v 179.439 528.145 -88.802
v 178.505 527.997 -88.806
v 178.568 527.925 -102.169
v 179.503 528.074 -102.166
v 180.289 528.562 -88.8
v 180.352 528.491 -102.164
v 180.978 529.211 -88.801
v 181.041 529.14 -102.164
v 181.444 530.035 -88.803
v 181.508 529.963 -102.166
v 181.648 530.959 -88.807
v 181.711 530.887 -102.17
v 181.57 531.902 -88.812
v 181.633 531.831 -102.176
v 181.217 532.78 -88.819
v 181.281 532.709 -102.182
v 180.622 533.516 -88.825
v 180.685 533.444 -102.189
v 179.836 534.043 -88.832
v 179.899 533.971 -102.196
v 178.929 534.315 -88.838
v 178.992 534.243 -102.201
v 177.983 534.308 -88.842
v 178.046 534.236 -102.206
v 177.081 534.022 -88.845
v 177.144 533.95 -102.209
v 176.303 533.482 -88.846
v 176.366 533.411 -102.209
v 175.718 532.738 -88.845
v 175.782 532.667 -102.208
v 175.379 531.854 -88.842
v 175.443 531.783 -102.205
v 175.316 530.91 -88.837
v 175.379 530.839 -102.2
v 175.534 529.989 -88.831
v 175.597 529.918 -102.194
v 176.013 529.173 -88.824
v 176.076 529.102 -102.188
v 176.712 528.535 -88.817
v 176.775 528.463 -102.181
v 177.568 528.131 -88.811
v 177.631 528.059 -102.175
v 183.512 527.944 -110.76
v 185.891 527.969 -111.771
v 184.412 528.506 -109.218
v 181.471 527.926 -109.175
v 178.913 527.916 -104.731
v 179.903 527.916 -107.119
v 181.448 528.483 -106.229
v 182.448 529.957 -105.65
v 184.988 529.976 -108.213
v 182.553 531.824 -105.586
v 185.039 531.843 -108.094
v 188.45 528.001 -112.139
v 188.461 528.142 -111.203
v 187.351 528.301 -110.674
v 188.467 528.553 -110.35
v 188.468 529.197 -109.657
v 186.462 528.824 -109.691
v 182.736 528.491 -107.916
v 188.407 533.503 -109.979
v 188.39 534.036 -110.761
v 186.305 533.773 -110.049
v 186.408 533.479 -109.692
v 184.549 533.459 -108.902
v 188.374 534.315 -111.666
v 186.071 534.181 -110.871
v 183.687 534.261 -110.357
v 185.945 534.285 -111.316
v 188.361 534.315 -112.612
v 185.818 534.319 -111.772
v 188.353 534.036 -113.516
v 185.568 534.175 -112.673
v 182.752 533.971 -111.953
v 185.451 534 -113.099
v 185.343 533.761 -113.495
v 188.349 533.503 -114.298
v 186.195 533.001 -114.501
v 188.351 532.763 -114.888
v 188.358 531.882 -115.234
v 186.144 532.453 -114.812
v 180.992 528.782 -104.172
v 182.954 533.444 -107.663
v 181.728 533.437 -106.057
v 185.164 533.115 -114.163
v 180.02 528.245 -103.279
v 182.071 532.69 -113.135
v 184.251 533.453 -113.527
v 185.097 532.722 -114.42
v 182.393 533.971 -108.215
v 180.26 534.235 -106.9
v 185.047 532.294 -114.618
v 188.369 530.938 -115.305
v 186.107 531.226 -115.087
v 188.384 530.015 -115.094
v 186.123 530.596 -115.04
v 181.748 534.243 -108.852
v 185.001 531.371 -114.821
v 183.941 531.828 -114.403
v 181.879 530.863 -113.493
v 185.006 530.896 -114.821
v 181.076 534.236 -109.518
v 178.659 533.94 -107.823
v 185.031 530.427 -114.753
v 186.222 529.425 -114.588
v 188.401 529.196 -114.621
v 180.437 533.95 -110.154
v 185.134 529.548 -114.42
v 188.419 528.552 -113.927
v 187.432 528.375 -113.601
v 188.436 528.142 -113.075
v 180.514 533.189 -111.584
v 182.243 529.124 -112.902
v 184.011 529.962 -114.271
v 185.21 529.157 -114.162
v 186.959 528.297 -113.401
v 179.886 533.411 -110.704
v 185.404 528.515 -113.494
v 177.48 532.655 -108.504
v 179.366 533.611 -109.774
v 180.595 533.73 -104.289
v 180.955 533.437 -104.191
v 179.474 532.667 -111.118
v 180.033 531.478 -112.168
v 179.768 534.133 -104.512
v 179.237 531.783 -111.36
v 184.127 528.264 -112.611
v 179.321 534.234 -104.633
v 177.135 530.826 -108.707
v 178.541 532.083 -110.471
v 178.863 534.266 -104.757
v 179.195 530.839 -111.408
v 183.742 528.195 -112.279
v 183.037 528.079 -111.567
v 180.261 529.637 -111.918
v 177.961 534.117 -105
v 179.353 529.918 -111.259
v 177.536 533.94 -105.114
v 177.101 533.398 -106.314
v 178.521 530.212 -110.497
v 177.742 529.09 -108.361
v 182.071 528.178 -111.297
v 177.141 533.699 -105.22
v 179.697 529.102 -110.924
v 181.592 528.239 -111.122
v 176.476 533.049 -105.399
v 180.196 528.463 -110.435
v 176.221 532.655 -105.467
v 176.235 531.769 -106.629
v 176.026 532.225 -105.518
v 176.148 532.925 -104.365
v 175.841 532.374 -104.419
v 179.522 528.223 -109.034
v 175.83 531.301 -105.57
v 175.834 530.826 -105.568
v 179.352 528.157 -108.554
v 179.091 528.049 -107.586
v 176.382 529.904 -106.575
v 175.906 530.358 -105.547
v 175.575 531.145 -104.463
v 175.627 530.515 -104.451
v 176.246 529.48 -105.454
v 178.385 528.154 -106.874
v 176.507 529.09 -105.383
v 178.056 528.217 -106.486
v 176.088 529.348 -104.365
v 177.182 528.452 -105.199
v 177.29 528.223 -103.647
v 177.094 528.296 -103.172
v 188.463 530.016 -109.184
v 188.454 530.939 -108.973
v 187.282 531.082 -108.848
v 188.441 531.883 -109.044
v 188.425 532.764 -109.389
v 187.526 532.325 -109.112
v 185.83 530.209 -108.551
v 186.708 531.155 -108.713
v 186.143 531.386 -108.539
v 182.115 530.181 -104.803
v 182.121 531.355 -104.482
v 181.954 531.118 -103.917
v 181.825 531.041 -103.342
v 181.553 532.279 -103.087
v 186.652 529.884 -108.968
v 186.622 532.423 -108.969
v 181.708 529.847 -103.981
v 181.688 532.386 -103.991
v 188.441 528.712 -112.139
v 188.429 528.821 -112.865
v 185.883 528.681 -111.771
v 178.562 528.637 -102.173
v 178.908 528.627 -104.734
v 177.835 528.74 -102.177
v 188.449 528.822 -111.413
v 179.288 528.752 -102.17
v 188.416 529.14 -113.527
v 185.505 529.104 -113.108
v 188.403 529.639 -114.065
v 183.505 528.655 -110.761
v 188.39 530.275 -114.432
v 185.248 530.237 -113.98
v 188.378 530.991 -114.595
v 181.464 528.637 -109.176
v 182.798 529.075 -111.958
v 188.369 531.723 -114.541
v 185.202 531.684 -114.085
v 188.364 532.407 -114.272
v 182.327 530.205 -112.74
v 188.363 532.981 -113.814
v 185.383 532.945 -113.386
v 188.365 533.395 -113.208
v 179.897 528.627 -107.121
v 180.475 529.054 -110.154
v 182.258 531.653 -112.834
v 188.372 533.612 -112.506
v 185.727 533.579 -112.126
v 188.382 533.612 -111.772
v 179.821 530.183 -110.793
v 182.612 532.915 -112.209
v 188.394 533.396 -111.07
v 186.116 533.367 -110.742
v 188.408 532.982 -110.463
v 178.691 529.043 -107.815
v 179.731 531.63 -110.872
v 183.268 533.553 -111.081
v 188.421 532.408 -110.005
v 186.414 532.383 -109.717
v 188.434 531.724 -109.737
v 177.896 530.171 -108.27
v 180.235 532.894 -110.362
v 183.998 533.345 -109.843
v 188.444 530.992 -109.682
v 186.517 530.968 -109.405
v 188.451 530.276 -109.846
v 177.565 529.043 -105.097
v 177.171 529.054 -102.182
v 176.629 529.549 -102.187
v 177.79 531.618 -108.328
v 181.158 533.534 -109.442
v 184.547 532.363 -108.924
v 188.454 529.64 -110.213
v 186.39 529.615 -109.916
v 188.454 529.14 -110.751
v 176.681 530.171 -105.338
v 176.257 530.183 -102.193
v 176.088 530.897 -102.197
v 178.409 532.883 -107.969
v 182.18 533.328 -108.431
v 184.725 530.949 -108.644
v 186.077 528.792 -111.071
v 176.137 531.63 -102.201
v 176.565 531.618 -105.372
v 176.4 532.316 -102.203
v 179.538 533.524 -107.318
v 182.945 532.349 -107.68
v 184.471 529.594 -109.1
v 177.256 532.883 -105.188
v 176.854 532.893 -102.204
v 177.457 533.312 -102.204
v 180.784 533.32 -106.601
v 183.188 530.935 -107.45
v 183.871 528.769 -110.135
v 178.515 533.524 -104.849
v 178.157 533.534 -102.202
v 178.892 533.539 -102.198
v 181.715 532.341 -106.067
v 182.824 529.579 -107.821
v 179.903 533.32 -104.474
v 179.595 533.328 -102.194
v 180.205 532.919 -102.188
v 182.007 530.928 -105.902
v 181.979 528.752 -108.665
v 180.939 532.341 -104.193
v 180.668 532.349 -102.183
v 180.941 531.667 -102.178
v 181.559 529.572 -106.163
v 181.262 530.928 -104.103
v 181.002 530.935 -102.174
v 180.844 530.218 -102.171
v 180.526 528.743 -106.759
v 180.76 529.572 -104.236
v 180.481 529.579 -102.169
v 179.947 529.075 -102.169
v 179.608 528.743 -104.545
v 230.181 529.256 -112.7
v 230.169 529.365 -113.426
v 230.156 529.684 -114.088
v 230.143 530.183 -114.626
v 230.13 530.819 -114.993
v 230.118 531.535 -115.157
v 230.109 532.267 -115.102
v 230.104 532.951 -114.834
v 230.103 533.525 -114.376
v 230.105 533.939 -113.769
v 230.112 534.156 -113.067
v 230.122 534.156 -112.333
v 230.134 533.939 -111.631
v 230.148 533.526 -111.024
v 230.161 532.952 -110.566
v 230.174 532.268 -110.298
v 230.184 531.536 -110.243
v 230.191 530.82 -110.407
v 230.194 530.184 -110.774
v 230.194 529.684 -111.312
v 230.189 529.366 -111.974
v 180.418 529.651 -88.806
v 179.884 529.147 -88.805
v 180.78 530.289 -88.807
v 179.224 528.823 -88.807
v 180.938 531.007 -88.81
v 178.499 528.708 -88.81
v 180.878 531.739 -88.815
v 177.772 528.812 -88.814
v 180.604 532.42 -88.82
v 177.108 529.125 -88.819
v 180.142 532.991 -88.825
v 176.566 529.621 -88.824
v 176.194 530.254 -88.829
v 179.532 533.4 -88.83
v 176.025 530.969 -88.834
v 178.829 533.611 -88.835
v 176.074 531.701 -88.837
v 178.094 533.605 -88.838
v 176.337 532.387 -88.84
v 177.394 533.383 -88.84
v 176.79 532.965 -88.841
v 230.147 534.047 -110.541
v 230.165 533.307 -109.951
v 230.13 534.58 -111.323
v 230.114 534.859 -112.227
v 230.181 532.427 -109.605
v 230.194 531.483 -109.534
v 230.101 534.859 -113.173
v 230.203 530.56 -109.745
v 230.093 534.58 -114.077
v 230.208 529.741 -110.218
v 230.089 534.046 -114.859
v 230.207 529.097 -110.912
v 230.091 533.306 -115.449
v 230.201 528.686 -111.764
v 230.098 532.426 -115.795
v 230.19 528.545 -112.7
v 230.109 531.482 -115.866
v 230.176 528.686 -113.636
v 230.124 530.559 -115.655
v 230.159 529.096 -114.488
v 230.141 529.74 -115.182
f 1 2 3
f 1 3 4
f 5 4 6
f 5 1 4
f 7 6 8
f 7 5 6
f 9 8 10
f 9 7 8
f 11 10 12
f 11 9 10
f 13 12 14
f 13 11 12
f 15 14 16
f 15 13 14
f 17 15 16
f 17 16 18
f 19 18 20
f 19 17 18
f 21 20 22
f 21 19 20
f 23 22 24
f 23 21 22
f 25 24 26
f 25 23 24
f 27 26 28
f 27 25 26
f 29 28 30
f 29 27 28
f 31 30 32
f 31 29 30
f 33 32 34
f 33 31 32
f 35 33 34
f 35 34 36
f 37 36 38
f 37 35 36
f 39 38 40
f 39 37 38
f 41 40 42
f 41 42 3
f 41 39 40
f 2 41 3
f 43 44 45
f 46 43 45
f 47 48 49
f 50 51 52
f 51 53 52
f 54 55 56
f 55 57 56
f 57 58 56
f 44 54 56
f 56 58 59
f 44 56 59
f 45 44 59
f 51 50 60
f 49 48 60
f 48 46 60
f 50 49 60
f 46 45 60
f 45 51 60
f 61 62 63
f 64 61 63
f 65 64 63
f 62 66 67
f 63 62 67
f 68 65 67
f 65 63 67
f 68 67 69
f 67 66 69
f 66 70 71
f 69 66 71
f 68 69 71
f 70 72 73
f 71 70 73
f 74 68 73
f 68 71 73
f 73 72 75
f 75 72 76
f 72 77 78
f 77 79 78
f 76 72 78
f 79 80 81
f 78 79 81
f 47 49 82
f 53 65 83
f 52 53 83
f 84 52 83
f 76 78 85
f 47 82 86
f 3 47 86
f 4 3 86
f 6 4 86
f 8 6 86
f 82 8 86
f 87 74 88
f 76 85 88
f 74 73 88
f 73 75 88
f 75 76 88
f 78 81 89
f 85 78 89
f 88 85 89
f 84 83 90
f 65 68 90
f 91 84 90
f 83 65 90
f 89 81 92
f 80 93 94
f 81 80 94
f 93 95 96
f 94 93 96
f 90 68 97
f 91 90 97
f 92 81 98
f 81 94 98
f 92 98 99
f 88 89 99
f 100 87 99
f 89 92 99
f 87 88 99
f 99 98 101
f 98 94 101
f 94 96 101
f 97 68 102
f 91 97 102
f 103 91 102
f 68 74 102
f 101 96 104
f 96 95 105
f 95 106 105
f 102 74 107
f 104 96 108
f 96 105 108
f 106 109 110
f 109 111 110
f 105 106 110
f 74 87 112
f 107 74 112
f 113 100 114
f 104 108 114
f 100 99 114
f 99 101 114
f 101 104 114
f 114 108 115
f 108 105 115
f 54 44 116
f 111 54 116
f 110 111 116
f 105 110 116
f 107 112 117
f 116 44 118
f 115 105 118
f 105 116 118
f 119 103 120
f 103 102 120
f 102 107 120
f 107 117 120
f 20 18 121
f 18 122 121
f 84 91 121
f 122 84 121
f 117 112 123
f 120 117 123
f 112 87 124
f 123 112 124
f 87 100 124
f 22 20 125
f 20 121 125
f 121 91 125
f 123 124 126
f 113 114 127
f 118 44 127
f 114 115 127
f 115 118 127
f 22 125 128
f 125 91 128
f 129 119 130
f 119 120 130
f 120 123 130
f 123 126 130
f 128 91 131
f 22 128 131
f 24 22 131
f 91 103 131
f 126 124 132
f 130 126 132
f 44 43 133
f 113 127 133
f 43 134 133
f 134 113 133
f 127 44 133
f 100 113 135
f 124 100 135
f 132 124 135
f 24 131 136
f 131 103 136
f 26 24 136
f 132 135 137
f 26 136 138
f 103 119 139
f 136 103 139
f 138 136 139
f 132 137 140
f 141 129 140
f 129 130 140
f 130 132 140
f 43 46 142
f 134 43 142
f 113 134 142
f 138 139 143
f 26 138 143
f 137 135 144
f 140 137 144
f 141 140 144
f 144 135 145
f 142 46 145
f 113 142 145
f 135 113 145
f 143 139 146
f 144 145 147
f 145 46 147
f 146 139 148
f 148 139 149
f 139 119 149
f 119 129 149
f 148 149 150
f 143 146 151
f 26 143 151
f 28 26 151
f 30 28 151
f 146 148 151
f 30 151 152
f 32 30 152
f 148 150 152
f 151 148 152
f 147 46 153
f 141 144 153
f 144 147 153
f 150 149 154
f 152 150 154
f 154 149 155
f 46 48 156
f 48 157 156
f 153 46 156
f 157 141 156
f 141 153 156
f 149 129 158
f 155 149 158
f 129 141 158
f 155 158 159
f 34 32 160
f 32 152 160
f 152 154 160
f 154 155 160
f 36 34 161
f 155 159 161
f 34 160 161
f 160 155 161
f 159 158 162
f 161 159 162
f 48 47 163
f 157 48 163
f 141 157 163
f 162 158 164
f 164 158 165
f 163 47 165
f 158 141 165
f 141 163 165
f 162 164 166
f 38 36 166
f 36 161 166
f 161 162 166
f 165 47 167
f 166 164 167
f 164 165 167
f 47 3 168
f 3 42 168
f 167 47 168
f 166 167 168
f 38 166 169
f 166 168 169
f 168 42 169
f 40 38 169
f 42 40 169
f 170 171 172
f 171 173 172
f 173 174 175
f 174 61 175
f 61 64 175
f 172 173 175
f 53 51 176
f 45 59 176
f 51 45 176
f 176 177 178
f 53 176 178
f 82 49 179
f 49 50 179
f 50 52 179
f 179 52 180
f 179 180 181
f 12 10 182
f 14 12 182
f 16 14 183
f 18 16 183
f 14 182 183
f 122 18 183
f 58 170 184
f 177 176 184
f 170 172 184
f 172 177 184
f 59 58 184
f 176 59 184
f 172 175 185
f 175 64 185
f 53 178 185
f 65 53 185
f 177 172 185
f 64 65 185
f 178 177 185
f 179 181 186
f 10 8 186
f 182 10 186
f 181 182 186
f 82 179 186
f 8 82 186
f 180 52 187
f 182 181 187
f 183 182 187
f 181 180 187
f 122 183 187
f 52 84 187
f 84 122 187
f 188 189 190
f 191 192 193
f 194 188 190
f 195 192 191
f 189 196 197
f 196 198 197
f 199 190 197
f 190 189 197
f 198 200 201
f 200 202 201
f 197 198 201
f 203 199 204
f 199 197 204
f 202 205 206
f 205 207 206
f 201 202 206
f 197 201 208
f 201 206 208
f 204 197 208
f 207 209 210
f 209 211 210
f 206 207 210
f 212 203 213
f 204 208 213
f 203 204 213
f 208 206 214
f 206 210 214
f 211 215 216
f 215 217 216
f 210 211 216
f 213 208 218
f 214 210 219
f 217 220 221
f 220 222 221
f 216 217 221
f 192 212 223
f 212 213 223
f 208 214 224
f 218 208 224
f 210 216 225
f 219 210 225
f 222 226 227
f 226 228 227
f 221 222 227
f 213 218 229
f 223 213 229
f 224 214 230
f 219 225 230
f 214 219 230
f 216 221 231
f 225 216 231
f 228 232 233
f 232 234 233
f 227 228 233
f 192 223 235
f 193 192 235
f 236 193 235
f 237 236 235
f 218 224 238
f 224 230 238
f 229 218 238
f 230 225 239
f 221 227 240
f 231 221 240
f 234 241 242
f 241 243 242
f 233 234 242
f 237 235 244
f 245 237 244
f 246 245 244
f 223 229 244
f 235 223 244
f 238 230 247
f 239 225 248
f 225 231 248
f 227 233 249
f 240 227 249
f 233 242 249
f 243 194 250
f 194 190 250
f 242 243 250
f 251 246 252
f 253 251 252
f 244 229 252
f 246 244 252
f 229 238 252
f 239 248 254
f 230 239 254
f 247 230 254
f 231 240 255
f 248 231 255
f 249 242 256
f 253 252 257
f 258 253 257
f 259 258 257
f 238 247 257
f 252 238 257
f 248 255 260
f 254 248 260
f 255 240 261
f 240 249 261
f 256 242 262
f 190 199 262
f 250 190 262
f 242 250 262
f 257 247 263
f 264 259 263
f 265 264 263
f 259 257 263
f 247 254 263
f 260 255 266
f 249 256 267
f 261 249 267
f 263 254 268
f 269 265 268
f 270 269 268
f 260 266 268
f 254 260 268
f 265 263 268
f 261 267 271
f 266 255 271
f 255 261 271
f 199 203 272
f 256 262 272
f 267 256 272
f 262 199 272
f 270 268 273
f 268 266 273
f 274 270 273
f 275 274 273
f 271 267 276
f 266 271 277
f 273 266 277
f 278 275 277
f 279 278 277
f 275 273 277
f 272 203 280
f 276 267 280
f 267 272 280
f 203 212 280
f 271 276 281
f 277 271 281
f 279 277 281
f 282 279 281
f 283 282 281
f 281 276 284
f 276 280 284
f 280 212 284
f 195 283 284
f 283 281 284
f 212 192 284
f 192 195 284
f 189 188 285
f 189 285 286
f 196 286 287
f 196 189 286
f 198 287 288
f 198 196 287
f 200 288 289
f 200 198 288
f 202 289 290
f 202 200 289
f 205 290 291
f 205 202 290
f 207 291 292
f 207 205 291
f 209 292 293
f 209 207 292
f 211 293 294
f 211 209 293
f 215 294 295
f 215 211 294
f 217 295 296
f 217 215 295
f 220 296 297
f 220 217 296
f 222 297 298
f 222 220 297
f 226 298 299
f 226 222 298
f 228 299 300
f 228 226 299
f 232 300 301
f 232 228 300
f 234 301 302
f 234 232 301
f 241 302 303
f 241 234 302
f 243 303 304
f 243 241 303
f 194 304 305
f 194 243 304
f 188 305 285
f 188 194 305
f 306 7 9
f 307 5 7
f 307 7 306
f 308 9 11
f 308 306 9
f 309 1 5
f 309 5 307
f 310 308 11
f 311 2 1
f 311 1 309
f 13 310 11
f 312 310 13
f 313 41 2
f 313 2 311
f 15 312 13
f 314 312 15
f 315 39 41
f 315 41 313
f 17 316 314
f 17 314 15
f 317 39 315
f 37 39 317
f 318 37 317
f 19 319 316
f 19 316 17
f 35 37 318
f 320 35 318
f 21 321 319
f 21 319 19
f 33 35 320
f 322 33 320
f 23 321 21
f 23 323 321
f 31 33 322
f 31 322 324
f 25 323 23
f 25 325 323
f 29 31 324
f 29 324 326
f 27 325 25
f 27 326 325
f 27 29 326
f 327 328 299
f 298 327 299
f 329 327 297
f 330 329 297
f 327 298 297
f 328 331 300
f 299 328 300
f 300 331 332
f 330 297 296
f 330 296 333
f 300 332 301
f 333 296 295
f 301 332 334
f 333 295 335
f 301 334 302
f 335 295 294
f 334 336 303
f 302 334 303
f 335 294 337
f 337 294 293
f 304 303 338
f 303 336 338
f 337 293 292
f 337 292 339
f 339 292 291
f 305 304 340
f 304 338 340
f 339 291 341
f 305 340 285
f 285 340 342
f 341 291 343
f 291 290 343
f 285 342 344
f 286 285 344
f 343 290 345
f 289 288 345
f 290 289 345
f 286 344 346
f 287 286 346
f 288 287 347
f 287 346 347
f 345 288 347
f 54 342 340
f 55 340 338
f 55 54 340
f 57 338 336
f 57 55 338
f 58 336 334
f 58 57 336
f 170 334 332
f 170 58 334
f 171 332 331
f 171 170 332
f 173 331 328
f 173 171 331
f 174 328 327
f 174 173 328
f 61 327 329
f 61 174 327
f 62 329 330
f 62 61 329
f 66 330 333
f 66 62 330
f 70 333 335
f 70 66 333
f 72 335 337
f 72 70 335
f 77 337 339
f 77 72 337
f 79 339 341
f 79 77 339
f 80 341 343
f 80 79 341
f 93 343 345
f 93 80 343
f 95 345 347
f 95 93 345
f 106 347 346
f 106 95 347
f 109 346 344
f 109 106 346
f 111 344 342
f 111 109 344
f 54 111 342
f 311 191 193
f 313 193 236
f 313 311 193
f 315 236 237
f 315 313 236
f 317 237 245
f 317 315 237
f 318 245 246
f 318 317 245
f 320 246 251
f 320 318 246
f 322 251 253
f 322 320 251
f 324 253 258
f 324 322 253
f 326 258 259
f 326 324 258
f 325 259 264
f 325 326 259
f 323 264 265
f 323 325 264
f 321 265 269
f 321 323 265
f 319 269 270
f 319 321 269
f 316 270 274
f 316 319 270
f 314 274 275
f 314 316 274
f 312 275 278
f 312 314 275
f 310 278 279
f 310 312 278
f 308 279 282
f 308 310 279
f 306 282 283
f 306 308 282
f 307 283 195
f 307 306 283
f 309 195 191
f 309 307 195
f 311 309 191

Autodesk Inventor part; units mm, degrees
ref_plane "YZ Plane" through (0, 0, 0) normal (1, 0, 0) x (0, 1, 0)
ref_plane "XZ Plane" through (0, 0, 0) normal (0, 1, 0) x (-1, 0, 0)
ref_plane "Work Plane5" through (230.1486, 531.7196, -112.7) normal (-0.9998, -0.013, 0.0134) x (0.013, -0.9999, 0)
sketch "Sketch5" plane through (230.1486, 531.7196, -112.7) normal (-0.9998, -0.013, 0.0134) x (0.013, -0.9999, 0)
  circle A0 centre (0, 0) radius 3.175
  circle A1 centre (0, 0) radius 2.4638
sketch3d "3D Sketch3"
  line L0 (230.1486, 531.7196, -112.7) -> (188.4086, 531.1757, -112.1388)
  arc A0 (188.4086, 531.1757, -112.1388) -> (178.5434, 531.1003, -102.1866) centre (188.5423, 531.2316, -102.14) ccw
  line L1 (178.5434, 531.1003, -102.1866) -> (178.4801, 531.1718, -88.8231)
  dimension "d12" = 9.9999
sweep "Sweep3" add profiles "Sketch5" path "3D Sketch3"
equation "\"OD\" = 6.35"
equation "\"t\" = 0.7112"
equation "\"L\" = PL"
equation "\"ID\" = 4.9276"
equation "\"PL\" = 70.6374"
equation "\"D\" = 15.24"
equation "\"Size_Designation\" = 1.2345"
properties material "Stainless Steel"
